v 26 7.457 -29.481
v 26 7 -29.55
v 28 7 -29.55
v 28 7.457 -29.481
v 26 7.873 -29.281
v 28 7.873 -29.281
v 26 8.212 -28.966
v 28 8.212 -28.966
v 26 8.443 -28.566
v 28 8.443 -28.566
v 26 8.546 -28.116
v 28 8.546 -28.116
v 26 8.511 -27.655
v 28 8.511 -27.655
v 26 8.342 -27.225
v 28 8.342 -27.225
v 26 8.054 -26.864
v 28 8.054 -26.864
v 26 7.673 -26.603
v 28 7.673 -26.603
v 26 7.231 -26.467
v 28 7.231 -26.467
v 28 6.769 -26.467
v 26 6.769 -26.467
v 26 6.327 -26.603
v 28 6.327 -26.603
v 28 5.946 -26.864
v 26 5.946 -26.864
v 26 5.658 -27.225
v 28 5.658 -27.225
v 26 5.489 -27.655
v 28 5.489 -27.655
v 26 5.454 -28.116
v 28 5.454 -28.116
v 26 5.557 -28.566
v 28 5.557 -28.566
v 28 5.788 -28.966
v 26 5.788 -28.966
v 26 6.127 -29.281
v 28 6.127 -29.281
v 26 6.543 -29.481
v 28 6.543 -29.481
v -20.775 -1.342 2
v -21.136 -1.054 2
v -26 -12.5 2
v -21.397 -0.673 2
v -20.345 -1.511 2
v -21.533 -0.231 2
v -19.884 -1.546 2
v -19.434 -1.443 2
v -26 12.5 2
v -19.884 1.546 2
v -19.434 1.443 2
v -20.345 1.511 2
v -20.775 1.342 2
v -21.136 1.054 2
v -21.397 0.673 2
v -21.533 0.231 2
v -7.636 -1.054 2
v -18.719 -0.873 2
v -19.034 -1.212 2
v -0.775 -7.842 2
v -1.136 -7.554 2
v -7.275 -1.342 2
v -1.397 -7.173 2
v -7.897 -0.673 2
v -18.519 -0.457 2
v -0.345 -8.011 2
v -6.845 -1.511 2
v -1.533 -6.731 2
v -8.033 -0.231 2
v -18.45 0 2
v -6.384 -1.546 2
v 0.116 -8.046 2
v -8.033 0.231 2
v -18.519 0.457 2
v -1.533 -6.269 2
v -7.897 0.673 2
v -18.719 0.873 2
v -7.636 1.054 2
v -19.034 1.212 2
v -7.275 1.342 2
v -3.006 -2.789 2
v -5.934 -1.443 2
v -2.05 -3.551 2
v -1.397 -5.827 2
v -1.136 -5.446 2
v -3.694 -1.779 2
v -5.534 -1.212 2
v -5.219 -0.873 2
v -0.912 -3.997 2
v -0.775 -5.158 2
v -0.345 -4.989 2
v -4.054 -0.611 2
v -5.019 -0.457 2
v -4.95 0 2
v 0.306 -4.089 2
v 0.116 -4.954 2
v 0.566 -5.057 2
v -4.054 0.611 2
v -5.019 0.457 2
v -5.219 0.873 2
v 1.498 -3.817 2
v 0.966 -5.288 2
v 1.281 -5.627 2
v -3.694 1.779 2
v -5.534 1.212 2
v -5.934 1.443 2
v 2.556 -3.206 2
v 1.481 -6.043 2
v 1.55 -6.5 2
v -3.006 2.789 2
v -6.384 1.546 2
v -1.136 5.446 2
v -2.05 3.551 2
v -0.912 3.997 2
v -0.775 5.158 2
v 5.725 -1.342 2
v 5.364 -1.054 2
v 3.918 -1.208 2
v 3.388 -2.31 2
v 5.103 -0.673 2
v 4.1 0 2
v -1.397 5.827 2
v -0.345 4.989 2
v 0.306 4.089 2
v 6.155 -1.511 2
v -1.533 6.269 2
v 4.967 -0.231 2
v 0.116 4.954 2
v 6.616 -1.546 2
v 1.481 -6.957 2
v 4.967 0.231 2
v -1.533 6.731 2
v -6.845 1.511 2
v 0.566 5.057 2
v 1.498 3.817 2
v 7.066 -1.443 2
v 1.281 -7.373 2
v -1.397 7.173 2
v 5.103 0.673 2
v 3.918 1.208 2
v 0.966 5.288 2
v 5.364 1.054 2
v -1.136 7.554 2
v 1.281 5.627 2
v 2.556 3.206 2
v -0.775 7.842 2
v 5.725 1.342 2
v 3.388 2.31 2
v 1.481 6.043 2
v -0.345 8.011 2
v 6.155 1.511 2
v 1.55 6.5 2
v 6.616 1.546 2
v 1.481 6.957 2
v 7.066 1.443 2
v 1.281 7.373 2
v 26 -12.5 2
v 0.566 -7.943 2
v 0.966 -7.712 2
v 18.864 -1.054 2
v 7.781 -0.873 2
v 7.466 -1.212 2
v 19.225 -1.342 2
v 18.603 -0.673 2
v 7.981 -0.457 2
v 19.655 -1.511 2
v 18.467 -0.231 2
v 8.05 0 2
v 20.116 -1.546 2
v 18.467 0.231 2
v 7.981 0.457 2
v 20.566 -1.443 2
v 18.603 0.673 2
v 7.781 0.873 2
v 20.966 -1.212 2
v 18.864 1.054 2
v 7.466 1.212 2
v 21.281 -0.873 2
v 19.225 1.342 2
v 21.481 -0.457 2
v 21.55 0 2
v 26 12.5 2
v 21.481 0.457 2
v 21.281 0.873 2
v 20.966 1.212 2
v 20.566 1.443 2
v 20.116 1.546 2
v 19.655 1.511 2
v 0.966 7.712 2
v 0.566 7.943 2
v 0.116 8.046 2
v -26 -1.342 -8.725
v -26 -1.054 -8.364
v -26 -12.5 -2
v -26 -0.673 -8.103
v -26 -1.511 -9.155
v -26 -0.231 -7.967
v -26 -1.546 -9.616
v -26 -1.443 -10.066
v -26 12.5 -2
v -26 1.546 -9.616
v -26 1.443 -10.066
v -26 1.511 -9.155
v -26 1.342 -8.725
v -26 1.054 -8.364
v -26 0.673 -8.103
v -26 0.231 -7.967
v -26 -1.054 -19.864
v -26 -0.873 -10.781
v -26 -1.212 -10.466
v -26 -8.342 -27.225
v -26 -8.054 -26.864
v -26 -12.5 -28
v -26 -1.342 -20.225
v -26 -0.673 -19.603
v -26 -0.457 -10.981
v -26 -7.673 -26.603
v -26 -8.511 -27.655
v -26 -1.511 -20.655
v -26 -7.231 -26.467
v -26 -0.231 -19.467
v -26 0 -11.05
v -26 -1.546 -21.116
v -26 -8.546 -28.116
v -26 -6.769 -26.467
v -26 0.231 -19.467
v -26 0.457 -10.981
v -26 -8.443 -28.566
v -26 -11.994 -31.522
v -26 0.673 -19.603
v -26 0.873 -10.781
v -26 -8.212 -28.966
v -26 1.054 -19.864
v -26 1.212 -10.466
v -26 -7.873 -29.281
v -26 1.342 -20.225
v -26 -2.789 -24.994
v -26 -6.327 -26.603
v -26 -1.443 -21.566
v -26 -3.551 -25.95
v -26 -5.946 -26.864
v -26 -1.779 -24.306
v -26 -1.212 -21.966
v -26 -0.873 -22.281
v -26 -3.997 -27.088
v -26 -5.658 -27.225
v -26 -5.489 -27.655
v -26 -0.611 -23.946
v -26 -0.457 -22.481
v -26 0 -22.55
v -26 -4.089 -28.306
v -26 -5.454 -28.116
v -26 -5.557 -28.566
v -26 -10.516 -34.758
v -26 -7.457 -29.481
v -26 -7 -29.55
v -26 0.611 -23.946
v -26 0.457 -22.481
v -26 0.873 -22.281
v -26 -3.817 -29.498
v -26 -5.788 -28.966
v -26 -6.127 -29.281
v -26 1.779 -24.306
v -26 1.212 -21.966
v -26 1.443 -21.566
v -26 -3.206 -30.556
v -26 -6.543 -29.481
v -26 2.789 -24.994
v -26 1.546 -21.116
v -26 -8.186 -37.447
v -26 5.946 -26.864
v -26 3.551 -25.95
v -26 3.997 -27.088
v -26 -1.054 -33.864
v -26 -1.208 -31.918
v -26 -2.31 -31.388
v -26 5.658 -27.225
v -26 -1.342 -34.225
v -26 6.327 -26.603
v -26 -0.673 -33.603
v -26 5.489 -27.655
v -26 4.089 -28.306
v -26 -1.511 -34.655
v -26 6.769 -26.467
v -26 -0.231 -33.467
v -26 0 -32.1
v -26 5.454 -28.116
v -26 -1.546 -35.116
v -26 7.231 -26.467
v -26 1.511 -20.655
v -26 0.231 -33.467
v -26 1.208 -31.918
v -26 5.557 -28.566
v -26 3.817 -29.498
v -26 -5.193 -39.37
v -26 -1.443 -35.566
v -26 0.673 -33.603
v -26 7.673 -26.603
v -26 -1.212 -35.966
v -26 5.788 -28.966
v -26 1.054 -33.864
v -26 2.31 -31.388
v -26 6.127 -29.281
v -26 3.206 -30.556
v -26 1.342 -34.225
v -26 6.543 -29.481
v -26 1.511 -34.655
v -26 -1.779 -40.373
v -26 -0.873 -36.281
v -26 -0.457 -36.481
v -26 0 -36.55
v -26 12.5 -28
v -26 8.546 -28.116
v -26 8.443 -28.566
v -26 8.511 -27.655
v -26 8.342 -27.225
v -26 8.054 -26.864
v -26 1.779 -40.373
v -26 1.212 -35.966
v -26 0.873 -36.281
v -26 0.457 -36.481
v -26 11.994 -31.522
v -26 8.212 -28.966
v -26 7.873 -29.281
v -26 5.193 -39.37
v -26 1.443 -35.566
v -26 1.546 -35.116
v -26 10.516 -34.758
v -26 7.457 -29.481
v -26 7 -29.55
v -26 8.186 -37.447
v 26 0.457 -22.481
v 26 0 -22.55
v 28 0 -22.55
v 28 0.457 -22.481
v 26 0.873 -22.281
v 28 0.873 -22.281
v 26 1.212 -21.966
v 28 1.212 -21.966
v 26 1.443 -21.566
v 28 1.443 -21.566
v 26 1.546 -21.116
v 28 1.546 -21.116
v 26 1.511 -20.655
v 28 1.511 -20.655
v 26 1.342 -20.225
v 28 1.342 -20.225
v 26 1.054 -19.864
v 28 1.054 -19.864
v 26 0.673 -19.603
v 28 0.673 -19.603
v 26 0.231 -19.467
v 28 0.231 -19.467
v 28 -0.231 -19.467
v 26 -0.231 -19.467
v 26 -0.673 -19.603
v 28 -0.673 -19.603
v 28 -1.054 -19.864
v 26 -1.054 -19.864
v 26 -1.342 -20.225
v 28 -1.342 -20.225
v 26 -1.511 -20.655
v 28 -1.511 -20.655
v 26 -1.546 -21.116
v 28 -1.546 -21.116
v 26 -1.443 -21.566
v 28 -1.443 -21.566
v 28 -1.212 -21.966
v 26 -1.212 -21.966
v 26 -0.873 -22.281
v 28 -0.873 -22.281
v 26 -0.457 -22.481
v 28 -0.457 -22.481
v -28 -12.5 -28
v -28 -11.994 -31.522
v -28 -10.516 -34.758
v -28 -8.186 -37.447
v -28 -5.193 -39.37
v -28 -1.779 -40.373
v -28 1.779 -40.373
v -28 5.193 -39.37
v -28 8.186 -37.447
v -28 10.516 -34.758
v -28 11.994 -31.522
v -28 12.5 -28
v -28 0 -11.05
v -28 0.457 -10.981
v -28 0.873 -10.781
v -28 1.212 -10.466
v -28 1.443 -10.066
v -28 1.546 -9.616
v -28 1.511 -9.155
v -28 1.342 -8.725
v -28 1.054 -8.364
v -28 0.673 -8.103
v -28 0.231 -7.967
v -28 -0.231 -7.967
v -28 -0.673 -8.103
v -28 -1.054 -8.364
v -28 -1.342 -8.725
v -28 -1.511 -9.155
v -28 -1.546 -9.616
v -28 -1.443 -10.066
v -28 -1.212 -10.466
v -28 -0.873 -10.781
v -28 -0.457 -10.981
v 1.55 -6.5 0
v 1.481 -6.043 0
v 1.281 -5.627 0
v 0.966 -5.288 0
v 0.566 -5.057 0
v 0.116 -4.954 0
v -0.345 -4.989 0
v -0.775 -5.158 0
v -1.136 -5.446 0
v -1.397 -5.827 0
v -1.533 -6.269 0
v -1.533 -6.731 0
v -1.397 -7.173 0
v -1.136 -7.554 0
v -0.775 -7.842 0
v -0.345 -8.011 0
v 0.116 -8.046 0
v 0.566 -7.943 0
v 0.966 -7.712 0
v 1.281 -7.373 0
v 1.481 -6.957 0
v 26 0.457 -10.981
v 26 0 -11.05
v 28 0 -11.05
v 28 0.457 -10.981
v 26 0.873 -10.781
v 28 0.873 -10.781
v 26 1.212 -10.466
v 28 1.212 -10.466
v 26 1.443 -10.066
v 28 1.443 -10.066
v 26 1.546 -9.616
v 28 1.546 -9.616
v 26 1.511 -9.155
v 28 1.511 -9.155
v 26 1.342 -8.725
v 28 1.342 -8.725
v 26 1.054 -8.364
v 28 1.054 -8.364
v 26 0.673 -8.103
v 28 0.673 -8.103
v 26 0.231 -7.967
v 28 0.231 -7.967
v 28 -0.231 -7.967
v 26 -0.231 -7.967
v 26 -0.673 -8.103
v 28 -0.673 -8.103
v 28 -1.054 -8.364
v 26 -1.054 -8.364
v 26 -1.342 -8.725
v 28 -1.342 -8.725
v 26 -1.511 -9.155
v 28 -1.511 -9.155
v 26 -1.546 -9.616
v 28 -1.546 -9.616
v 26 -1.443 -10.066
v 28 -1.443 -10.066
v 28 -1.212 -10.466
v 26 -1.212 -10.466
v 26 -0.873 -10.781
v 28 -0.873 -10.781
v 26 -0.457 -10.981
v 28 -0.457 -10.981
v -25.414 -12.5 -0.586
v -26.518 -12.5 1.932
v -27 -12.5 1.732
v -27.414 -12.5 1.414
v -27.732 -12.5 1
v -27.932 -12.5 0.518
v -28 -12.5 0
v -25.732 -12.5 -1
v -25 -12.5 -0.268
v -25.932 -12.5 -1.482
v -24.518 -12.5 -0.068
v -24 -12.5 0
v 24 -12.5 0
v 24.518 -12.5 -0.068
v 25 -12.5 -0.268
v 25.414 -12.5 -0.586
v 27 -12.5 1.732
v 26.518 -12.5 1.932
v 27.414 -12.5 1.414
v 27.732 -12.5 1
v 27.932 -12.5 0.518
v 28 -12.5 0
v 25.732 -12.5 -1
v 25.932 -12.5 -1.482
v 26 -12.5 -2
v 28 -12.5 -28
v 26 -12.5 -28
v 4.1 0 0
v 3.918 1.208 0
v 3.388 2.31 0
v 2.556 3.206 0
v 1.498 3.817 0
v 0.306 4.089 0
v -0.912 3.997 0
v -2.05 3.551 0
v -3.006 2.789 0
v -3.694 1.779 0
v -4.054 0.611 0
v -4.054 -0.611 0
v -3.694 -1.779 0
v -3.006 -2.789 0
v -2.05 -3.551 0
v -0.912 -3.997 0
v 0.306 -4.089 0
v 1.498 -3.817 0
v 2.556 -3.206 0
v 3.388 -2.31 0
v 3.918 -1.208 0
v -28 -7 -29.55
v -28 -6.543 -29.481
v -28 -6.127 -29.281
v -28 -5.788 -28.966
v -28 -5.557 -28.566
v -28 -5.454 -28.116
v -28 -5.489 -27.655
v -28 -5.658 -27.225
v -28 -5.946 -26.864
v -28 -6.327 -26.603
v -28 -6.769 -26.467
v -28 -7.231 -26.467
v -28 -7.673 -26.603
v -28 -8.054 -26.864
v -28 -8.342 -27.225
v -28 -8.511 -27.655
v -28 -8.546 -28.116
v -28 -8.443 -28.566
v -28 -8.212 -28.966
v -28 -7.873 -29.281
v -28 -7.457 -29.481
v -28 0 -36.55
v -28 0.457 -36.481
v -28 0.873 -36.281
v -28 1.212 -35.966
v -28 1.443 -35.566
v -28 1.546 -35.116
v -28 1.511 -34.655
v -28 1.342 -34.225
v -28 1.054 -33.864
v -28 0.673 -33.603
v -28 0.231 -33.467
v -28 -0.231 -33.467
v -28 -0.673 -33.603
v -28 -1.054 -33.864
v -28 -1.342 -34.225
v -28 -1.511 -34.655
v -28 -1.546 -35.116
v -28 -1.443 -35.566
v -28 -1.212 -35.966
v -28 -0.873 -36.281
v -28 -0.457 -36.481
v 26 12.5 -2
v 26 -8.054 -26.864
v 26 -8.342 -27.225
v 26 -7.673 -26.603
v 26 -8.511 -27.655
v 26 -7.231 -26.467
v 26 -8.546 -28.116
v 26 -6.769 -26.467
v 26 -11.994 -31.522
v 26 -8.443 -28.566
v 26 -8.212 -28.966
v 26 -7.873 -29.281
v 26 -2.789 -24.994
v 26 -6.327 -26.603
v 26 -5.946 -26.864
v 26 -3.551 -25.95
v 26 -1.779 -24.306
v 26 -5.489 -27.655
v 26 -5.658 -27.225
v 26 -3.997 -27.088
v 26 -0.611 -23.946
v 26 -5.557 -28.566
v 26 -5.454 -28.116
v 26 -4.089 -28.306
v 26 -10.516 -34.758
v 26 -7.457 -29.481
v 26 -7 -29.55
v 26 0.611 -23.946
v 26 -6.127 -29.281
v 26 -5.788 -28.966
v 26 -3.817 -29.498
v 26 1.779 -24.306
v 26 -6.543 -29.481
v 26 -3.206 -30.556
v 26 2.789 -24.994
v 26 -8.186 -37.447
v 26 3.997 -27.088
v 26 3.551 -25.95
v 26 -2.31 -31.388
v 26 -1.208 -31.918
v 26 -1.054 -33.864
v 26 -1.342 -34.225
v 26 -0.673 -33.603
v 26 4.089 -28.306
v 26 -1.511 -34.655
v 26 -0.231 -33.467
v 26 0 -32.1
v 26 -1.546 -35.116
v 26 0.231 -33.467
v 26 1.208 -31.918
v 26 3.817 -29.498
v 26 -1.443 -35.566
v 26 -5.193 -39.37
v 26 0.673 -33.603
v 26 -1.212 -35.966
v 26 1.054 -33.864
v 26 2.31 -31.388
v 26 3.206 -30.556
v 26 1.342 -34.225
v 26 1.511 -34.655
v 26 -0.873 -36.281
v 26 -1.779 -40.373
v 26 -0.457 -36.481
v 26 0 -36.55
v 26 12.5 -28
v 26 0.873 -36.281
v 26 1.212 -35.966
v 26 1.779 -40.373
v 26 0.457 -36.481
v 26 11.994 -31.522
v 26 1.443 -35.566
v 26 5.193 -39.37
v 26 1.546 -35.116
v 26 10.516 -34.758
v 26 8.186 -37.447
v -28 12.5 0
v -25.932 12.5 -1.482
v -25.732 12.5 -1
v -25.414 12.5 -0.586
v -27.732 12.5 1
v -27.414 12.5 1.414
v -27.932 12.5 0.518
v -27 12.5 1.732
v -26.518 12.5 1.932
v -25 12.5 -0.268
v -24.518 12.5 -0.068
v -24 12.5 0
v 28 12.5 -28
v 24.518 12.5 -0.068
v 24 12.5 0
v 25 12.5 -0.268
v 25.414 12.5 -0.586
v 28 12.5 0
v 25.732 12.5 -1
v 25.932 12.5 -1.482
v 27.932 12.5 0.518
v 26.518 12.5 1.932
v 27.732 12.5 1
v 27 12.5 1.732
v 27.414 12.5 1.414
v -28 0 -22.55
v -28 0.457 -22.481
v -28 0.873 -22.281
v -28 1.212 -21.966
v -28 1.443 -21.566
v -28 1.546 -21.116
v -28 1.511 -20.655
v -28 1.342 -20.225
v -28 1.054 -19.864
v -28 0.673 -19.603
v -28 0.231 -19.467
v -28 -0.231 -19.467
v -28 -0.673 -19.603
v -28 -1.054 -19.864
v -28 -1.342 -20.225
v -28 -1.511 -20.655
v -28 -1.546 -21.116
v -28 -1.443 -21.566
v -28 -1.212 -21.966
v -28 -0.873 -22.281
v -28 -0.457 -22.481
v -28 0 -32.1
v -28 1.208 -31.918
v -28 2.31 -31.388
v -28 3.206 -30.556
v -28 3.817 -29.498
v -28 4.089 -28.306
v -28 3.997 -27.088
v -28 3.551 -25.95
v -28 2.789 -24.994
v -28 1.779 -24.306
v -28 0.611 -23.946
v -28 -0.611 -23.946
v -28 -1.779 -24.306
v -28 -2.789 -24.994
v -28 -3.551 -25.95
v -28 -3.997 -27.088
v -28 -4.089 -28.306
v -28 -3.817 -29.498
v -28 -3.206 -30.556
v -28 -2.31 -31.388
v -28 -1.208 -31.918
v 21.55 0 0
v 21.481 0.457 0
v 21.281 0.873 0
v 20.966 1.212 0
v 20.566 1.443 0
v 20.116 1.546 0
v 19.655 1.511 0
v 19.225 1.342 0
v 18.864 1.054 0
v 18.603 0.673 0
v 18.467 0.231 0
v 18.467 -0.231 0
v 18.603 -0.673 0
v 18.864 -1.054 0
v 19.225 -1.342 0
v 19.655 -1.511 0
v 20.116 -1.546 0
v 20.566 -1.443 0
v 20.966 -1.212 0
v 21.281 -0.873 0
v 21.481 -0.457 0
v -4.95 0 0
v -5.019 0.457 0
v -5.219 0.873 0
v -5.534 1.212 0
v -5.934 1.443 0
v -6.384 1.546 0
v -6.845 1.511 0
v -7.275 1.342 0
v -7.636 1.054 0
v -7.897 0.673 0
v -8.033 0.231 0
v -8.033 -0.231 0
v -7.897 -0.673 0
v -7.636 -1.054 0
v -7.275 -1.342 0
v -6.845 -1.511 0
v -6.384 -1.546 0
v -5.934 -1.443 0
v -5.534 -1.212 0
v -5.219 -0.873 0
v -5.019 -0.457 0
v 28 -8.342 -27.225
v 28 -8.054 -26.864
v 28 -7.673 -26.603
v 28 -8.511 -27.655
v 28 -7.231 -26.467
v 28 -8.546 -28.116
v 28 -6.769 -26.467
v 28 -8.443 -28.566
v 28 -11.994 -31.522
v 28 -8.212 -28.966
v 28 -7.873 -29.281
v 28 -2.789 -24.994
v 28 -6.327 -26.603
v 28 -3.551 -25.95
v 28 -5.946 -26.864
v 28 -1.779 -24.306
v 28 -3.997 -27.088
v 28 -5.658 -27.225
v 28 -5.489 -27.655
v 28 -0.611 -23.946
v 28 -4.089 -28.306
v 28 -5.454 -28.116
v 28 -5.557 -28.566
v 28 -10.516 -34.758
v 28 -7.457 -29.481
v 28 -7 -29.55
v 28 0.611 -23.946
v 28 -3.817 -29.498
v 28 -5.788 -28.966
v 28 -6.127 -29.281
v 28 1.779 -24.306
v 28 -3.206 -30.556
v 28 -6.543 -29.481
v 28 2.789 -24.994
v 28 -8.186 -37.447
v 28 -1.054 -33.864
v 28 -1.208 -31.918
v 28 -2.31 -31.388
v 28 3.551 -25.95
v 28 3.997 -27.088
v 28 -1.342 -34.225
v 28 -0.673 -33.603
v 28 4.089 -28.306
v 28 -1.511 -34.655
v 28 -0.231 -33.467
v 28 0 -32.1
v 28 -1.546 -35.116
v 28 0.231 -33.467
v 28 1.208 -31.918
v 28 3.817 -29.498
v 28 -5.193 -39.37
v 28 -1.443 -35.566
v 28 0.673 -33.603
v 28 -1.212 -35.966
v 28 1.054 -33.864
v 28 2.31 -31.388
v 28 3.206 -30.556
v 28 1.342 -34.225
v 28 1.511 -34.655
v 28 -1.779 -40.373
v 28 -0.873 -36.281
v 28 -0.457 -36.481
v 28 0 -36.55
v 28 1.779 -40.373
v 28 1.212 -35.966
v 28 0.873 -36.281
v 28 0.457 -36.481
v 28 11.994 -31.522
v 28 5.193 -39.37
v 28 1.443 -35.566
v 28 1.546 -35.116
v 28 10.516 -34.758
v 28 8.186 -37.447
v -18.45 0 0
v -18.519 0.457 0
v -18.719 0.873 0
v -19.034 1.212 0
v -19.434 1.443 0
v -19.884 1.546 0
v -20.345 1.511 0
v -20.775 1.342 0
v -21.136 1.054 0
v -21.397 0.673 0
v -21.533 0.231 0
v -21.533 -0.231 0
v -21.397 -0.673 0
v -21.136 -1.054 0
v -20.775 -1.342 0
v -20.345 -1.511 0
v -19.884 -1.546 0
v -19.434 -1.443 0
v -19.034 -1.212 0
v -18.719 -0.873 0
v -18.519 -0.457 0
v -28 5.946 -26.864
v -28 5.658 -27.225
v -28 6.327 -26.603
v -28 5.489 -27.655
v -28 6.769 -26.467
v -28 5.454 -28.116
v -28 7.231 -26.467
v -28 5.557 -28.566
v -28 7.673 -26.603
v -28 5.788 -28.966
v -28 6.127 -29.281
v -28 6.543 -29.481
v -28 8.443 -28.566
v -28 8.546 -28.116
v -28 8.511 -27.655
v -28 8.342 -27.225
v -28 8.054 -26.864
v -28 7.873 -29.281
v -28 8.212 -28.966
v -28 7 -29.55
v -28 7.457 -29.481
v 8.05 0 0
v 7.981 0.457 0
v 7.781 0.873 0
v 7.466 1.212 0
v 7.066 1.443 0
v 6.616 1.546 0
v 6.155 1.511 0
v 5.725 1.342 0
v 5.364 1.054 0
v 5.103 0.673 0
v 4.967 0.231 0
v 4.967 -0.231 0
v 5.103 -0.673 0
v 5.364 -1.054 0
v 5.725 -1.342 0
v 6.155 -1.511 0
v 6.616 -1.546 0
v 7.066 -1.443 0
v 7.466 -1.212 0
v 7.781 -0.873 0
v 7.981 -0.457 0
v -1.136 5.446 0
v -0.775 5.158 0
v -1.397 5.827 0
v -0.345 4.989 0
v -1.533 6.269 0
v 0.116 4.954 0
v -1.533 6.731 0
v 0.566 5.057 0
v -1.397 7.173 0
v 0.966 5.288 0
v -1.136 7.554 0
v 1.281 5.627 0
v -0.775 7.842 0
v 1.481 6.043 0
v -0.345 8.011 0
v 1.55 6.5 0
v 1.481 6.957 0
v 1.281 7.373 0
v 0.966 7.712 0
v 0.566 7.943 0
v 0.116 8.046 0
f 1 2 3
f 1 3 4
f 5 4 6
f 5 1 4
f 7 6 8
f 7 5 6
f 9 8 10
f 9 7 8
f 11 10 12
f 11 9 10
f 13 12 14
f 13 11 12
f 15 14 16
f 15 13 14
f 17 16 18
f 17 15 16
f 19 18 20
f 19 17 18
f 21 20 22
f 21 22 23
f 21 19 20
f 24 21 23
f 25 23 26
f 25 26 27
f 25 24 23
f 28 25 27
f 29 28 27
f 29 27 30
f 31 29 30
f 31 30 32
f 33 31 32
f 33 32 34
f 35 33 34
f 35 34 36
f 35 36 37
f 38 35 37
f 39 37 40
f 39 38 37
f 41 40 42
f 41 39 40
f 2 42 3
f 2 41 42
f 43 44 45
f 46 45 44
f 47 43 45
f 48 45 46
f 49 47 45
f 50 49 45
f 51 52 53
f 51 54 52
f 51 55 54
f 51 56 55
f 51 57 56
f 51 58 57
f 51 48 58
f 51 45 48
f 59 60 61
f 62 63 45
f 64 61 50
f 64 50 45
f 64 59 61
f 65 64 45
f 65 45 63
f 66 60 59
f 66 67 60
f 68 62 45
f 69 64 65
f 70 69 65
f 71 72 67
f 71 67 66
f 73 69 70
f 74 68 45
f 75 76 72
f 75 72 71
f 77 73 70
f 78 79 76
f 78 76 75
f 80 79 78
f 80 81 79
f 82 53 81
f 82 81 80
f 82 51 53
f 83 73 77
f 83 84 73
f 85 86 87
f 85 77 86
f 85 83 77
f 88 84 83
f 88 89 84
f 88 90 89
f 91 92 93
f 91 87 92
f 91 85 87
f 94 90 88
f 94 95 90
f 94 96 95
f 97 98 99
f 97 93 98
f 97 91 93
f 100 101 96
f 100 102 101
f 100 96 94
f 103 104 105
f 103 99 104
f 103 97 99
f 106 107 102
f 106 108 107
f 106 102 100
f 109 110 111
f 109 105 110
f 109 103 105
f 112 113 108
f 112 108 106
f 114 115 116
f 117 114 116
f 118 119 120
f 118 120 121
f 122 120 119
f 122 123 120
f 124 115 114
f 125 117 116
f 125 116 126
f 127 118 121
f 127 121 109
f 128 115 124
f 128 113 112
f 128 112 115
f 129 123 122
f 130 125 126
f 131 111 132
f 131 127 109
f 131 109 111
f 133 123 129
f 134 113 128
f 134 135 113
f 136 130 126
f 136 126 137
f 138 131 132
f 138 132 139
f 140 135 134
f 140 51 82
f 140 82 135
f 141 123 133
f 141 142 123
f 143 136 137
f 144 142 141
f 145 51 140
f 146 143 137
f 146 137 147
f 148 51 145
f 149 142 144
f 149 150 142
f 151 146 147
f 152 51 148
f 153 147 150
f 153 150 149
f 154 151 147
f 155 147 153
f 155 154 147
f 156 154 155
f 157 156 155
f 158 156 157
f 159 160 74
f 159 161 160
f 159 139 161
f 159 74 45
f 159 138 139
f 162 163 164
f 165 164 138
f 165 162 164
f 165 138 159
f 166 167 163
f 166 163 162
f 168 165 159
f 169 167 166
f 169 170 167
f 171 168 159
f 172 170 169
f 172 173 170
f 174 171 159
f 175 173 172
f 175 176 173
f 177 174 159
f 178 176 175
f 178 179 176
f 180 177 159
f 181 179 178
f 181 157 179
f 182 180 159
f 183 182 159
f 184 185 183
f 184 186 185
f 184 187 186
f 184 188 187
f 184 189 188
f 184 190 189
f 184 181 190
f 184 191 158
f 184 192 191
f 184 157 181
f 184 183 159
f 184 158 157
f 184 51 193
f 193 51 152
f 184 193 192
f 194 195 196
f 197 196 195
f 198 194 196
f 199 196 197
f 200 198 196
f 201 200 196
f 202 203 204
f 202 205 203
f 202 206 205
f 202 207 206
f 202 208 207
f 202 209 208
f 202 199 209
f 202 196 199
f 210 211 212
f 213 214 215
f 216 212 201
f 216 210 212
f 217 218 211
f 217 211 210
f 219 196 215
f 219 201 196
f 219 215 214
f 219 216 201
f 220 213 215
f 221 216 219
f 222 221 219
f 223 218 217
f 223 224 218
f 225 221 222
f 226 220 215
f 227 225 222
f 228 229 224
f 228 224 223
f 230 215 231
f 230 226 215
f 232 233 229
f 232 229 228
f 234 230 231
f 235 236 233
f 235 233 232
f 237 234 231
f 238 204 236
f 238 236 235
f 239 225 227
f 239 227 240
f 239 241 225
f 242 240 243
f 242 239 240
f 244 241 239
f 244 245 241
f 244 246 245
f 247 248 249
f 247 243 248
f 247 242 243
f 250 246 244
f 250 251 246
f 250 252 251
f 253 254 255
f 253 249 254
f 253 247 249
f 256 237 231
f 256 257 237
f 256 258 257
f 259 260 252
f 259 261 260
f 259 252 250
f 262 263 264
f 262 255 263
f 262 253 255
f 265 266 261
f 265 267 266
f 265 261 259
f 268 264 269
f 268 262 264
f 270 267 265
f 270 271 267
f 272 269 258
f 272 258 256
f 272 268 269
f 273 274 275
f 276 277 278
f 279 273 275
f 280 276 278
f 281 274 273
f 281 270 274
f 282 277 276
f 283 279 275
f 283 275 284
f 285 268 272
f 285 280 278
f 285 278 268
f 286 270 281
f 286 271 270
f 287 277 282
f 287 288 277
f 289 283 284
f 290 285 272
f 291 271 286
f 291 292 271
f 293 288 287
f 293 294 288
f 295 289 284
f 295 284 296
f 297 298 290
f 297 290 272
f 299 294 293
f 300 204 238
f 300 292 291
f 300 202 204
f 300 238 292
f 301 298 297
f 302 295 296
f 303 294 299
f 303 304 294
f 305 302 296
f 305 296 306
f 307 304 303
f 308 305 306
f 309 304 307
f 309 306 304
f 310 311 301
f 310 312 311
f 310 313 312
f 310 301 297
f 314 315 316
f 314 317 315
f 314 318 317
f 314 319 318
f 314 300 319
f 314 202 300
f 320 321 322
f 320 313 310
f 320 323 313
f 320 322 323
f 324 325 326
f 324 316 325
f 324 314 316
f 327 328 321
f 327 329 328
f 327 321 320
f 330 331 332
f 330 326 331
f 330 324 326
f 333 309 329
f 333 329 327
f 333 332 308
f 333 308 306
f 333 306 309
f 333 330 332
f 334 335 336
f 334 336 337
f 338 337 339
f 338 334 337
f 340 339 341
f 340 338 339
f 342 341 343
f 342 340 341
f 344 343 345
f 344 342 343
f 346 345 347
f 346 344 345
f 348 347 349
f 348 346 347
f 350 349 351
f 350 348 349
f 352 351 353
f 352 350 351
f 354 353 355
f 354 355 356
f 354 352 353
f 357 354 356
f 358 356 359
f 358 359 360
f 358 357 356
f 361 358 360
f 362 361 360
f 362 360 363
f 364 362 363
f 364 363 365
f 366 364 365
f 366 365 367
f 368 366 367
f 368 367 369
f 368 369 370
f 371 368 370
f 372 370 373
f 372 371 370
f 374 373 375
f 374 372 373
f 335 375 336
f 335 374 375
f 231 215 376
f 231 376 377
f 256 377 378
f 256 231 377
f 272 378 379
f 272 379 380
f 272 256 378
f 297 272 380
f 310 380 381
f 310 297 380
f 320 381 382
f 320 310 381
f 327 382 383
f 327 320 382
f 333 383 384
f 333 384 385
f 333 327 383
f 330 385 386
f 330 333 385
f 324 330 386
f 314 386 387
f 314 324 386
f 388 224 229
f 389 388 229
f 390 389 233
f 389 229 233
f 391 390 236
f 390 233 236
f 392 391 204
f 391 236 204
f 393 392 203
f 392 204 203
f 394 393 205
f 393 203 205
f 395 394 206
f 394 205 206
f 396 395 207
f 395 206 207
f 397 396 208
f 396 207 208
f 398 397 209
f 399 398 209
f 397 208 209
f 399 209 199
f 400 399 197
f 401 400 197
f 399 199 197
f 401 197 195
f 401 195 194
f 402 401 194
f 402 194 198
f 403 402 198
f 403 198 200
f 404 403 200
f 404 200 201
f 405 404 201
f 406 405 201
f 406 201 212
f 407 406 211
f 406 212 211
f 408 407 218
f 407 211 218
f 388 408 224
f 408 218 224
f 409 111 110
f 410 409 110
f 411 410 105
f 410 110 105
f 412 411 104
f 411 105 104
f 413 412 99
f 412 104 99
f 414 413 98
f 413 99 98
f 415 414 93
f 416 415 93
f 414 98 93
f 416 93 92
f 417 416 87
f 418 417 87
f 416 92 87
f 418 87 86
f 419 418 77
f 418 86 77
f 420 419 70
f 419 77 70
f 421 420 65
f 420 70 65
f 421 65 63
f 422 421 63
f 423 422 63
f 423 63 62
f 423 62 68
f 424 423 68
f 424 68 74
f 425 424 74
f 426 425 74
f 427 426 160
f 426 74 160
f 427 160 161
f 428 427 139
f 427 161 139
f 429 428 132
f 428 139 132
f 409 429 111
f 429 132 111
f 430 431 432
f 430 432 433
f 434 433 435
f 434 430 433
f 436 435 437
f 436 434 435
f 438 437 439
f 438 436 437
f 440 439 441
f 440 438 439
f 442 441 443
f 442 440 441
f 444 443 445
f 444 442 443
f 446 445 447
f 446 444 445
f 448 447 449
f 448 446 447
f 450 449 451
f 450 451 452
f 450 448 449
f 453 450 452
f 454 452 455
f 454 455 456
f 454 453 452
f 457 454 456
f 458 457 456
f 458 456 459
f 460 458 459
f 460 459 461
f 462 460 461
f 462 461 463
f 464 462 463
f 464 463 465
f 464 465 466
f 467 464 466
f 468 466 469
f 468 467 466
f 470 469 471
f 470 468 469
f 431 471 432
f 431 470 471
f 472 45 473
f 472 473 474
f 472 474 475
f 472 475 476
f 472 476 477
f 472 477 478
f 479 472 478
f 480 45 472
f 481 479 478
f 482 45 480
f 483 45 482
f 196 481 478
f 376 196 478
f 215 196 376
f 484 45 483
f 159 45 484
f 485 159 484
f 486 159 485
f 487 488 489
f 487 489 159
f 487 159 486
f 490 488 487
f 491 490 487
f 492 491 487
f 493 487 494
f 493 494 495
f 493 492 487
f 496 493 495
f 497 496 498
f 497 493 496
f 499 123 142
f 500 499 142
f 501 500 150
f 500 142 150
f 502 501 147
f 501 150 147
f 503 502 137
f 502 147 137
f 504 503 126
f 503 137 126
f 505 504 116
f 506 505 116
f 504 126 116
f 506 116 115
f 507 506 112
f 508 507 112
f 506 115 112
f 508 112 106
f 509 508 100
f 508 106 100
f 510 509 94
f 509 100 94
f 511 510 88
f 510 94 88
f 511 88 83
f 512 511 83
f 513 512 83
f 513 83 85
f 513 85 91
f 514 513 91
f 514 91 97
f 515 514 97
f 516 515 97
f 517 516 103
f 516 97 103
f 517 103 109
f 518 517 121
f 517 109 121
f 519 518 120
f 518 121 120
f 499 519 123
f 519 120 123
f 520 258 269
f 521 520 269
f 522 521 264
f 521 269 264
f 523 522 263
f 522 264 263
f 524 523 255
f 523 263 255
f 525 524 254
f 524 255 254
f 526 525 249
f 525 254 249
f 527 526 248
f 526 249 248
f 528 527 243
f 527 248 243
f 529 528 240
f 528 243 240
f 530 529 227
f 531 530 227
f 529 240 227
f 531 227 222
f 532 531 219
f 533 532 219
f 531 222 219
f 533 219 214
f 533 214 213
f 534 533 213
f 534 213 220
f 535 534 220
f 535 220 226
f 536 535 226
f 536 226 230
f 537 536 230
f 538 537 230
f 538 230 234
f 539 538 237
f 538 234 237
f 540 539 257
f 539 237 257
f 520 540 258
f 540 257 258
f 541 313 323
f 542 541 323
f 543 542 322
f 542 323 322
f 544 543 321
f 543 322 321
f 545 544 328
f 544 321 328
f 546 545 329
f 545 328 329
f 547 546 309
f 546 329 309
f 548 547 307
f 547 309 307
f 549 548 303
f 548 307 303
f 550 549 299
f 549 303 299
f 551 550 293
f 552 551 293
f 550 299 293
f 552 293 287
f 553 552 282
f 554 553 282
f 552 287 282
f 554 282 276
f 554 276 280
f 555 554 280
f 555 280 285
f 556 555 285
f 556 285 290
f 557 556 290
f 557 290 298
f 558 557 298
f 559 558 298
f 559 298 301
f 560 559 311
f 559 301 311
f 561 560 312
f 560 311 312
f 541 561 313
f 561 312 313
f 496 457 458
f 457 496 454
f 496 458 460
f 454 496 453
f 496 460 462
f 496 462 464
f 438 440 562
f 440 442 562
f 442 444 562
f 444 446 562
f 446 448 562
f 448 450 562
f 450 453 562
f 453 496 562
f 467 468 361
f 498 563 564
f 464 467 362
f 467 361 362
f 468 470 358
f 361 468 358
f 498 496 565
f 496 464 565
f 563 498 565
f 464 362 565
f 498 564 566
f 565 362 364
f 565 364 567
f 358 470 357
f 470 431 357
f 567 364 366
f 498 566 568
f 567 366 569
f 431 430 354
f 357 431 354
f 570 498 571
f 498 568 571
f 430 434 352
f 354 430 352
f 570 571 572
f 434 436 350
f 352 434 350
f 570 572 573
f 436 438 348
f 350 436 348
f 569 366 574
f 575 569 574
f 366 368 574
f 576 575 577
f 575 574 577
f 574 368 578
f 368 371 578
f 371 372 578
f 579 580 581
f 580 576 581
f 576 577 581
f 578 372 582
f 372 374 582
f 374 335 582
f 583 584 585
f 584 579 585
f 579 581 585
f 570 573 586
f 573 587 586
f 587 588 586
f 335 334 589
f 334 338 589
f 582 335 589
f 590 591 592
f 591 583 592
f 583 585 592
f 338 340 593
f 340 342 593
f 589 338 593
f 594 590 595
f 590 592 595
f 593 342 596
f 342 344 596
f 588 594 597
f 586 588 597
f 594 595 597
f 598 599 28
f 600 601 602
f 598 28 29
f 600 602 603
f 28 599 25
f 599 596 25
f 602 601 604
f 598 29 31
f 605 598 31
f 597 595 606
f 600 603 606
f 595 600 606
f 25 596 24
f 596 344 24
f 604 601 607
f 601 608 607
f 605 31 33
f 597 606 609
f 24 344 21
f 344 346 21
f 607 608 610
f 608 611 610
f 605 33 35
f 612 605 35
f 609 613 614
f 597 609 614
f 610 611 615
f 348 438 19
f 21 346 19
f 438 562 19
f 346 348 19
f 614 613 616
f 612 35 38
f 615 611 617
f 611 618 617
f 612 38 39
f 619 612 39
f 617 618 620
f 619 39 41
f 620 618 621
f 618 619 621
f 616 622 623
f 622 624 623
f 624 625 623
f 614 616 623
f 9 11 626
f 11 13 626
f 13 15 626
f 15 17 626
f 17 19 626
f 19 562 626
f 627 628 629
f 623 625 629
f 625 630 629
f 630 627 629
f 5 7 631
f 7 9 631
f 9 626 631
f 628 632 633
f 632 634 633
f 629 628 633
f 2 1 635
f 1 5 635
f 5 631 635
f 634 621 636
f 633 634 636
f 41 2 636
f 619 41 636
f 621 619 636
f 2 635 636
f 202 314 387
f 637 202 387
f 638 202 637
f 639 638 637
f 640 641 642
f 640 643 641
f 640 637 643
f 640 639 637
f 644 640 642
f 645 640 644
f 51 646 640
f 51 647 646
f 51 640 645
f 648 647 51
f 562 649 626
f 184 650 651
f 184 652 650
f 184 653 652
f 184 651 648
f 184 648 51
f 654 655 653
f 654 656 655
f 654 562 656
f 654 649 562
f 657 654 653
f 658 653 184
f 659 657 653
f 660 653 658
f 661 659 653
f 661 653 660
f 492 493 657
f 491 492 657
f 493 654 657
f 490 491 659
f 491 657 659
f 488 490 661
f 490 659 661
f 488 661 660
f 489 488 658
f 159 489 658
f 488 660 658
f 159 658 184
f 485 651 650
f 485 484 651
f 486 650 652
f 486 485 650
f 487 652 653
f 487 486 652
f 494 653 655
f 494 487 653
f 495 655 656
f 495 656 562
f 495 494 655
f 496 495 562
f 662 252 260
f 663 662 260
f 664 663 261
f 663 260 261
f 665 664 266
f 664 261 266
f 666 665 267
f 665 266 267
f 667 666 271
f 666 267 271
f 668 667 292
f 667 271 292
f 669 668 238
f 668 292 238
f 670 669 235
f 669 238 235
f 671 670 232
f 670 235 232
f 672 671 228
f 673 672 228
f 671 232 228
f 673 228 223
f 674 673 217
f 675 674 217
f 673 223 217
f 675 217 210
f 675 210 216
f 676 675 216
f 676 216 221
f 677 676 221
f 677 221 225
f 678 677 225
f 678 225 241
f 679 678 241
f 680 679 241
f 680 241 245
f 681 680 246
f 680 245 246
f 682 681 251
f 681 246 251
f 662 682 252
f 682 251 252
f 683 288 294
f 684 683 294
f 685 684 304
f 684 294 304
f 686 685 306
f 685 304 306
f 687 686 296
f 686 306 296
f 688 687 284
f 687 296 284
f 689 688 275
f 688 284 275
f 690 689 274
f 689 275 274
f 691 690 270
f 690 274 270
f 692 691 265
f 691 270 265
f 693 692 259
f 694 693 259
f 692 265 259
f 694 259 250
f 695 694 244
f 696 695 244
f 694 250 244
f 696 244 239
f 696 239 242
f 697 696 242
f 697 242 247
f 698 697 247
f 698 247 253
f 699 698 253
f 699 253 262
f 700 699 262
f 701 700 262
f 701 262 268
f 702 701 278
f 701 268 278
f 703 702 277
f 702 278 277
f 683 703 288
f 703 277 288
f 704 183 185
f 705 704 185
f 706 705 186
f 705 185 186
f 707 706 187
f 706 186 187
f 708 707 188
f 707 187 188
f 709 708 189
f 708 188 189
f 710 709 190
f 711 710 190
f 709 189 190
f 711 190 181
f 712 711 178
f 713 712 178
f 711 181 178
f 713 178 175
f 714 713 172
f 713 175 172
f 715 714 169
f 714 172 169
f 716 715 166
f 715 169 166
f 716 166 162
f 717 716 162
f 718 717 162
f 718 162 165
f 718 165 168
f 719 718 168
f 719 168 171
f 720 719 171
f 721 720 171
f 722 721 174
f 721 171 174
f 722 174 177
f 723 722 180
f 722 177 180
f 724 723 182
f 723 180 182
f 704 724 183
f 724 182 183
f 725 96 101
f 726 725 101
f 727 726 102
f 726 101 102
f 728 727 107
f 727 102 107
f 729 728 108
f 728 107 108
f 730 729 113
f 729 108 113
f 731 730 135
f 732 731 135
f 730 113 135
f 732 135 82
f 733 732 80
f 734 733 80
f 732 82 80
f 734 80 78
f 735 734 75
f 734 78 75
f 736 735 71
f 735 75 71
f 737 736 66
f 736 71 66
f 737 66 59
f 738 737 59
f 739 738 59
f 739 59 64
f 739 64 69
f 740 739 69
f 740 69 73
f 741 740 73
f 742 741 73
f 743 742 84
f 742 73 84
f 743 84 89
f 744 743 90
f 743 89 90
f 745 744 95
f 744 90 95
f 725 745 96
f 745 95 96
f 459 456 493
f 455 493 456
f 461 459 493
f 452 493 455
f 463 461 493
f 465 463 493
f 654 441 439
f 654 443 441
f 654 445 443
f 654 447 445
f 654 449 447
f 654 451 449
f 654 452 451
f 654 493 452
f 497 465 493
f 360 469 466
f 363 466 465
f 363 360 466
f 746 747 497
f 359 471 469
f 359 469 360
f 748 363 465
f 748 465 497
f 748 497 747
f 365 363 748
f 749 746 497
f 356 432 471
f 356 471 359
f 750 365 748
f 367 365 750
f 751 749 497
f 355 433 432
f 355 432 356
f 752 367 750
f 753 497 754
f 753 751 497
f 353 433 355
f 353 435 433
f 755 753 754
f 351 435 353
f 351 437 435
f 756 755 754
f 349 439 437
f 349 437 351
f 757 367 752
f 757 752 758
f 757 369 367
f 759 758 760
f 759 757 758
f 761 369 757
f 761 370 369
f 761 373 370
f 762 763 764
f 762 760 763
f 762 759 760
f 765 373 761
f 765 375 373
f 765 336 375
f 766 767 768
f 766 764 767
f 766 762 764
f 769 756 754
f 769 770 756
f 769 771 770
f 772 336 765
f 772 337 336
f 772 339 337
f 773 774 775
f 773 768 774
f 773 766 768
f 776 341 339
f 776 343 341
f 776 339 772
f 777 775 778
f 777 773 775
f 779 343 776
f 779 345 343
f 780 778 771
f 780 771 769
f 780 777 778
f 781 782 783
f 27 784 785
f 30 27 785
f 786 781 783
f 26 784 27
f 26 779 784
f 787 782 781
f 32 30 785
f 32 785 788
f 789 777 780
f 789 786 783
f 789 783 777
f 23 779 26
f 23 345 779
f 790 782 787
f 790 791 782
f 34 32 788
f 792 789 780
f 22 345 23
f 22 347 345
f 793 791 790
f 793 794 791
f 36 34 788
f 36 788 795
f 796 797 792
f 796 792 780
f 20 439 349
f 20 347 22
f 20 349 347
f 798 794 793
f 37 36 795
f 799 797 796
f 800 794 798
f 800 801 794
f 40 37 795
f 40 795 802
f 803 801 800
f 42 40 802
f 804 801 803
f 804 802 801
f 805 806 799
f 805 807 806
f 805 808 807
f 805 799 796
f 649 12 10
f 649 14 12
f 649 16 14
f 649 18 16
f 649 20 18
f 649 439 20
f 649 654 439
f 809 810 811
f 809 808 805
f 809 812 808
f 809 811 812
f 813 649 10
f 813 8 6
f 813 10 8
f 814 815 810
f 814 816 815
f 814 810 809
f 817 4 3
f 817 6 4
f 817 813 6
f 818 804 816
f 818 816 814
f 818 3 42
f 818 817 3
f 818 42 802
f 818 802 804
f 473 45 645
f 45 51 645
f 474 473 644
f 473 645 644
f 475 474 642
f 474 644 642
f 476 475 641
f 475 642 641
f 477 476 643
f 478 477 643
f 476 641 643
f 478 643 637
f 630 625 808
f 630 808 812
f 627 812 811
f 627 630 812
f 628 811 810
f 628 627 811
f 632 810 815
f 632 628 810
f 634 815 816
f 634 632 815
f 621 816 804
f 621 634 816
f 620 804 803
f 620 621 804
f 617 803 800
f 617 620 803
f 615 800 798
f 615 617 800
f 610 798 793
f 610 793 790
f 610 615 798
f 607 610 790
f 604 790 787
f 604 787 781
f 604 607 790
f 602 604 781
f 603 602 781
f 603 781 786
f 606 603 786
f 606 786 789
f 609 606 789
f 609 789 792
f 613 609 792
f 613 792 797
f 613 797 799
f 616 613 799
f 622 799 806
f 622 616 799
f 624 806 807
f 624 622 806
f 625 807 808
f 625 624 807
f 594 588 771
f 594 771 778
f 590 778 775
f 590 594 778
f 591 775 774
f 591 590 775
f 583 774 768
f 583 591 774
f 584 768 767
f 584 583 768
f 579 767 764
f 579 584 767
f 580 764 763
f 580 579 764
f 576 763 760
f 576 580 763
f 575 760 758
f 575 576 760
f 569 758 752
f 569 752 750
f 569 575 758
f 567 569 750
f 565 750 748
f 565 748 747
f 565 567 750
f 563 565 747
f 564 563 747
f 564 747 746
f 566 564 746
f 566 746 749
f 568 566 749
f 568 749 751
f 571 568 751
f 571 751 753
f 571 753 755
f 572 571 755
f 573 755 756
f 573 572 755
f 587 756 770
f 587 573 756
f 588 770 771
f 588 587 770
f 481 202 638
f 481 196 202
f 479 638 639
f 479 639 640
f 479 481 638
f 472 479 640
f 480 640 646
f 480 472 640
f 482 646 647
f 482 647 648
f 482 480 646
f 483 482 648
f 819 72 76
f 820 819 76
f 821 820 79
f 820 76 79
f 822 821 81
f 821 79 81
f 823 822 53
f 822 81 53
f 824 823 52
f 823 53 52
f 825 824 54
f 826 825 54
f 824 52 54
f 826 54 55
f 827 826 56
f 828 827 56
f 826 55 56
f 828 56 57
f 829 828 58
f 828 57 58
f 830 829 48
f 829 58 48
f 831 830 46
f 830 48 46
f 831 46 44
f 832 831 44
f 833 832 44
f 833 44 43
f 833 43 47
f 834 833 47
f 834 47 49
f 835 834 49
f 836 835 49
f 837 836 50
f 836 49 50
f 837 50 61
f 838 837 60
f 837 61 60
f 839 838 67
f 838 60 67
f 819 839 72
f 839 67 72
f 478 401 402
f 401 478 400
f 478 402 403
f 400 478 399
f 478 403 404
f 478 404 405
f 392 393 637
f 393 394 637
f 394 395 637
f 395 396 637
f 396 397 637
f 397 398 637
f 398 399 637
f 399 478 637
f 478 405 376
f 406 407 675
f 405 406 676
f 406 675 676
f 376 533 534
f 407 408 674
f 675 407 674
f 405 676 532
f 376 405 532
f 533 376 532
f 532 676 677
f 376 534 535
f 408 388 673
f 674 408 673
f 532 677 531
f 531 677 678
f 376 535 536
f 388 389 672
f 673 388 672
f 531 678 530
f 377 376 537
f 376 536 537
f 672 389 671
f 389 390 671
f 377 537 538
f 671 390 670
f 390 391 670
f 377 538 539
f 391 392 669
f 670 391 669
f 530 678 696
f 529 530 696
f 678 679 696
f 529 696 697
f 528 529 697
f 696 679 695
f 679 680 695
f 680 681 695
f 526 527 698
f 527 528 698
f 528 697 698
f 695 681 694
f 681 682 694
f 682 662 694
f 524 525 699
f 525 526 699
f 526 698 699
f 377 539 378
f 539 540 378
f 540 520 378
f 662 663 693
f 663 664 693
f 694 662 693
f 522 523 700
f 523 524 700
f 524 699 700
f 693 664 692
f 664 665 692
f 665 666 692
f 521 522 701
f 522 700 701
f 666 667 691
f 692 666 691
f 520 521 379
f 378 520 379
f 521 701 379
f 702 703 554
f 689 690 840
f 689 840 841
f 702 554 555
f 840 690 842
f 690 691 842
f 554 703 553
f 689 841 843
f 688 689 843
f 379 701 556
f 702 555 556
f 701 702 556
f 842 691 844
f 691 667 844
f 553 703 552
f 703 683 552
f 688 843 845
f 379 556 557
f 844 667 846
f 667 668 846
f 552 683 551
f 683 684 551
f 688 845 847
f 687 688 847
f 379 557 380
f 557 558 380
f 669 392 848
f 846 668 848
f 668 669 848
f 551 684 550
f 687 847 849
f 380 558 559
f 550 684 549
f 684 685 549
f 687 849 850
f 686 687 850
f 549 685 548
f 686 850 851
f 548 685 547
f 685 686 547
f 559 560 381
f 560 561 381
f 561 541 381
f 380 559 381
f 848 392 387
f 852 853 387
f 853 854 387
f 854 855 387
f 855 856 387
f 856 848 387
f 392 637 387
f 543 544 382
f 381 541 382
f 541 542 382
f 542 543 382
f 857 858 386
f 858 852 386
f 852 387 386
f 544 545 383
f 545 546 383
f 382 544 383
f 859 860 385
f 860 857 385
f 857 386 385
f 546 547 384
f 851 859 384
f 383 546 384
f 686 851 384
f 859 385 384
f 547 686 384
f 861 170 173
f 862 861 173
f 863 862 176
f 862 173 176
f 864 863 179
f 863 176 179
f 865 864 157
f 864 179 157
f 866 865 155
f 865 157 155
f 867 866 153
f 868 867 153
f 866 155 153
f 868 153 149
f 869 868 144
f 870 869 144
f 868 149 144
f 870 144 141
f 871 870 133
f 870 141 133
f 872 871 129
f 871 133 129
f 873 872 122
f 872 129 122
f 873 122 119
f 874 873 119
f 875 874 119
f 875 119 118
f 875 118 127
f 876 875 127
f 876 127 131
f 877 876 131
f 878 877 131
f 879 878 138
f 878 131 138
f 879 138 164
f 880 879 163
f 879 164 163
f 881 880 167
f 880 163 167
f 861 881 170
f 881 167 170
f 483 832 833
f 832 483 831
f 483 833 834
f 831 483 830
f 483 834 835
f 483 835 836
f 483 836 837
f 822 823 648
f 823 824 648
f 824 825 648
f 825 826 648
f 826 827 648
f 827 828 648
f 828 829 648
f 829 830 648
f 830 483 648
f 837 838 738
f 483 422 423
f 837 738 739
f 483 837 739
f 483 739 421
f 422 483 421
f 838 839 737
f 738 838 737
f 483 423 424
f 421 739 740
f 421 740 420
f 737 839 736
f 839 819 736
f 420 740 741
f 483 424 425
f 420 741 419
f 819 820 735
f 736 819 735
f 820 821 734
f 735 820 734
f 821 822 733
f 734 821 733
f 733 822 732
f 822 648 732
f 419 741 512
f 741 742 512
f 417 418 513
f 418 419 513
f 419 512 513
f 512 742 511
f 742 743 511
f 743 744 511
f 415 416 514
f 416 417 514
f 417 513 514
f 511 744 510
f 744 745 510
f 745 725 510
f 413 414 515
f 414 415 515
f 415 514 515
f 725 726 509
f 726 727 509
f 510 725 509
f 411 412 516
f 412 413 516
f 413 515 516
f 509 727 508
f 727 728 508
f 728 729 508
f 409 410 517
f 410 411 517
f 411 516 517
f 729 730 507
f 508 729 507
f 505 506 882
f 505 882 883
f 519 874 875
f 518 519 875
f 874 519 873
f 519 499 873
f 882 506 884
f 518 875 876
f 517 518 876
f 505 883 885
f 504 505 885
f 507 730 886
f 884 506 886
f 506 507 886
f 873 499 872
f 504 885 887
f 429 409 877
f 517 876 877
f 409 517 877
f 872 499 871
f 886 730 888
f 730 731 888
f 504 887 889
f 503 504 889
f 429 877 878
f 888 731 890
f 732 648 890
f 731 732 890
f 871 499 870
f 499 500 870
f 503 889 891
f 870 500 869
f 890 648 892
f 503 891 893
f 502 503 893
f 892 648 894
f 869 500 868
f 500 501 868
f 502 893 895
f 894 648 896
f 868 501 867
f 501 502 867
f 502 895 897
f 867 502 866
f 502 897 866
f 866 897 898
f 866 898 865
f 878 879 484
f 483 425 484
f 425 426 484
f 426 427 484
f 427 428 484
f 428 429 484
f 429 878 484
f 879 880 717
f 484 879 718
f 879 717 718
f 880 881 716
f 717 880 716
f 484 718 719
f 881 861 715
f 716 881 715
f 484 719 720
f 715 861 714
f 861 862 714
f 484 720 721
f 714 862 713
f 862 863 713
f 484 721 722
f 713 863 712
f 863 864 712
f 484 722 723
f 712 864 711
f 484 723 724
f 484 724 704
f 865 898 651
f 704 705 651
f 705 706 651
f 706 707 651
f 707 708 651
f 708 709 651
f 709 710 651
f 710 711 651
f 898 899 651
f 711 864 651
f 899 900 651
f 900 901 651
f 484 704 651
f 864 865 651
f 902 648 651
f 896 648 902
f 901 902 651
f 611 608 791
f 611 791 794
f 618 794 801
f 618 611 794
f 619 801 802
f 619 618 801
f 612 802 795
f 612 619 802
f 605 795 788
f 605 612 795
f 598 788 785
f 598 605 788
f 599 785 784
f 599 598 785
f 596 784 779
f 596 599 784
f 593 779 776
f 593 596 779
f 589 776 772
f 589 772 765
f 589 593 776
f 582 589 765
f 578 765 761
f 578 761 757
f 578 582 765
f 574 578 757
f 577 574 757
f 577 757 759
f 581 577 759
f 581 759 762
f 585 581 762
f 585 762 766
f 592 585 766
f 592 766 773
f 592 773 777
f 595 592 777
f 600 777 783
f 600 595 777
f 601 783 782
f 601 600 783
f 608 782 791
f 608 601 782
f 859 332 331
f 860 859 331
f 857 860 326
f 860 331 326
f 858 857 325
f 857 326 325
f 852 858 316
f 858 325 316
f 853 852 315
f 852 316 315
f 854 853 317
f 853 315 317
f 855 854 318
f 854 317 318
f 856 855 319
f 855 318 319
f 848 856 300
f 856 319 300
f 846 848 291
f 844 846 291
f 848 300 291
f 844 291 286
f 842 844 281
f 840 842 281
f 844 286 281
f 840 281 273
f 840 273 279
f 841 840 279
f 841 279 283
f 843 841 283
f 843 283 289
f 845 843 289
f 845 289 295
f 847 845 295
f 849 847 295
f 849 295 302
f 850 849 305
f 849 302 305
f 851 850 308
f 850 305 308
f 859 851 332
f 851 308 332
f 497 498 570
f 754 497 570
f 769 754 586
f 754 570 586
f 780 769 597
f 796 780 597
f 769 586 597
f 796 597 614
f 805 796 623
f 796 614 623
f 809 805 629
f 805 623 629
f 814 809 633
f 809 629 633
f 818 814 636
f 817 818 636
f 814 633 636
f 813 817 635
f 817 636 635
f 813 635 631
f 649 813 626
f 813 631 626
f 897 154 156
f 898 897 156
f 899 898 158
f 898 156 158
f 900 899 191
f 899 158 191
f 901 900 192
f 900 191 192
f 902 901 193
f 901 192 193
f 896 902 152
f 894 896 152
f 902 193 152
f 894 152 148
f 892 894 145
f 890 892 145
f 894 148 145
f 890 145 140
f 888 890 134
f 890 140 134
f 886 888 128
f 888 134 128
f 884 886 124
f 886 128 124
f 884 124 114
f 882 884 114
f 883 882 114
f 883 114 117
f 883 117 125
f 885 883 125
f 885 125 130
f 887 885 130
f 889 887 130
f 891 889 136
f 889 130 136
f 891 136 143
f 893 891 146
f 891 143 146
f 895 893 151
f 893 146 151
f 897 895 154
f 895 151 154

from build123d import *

# Parameters (mm, degrees)
SKETCH_1_W            = 56
SKETCH_1_H            = 25
EXTRUDE_1_DEPTH       = 2
EXTRUDE_START         = -2
EXTRUDE_2_OUTLINE_R   = 1.55
EXTRUDE_2_OUTLINE_R_2 = 4.1
EXTRUDE_2_DEPTH       = 2
SKETCH_3_R            = 1.55
SKETCH_3_R_2          = 4.1
CUT_EXTRUDE_1_DEPTH   = 2
FILLET_1_R            = 2


# Read off the part's stored shape, not the designer's step: 凸台-拉伸2
with BuildPart() as part:
    # 草图1 → 凸台-拉伸1 (new body)
    with BuildSketch(Plane.XY):
        Rectangle(SKETCH_1_W, SKETCH_1_H)
    extrude(amount=EXTRUDE_1_DEPTH)

    # 凸台-拉伸2 outline → 凸台-拉伸2 (add)
    with BuildSketch(Plane(origin=(28, 0, 0), x_dir=(0, 0, -1), z_dir=(1, 0, 0)).offset(EXTRUDE_START)):
        with BuildLine():
            Line((0, -12.5), (28, -12.5))
            ThreePointArc((28, -12.5), (40.5, 0), (28, 12.5))
            Line((28, 12.5), (0, 12.5))
            Line((0, 12.5), (0, -12.5))
        make_face()
        with Locations((28, -7)):
            Circle(EXTRUDE_2_OUTLINE_R, mode=Mode.SUBTRACT)
        with Locations((9.5, 0)):
            Circle(EXTRUDE_2_OUTLINE_R, mode=Mode.SUBTRACT)
        with Locations((21, 0)):
            Circle(EXTRUDE_2_OUTLINE_R, mode=Mode.SUBTRACT)
        with Locations((28, 0)):
            Circle(EXTRUDE_2_OUTLINE_R_2, mode=Mode.SUBTRACT)
        with Locations((35, 0)):
            Circle(EXTRUDE_2_OUTLINE_R, mode=Mode.SUBTRACT)
        with Locations((28, 7)):
            Circle(EXTRUDE_2_OUTLINE_R, mode=Mode.SUBTRACT)
    extrude_2 = extrude(amount=EXTRUDE_2_DEPTH)

    # 镜向2: 凸台-拉伸2 across plane
    add(extrude_2.mirror(Plane.ZY))

    # 草图3 → 切除-拉伸1 (cut)
    with BuildSketch(Plane.XY.offset(2)):
        with Locations((-20, 0)):
            Circle(SKETCH_3_R)
        with Locations((-6.5, 0)):
            Circle(SKETCH_3_R)
        with Locations((6.5, 0)):
            Circle(SKETCH_3_R)
        with Locations((0, -6.5)):
            Circle(SKETCH_3_R)
        Circle(SKETCH_3_R_2)
        with Locations((0, 6.5)):
            Circle(SKETCH_3_R)
        with Locations((20, 0)):
            Circle(SKETCH_3_R)
    extrude(amount=-CUT_EXTRUDE_1_DEPTH, mode=Mode.SUBTRACT)

    # 圆角1
    fillet_1_edges = [part.edges().sort_by_distance(p)[0] for p in [
        (-28, 0, 2),
        (26, 0, 0),
        (-26, 0, 0),
        (28, 0, 2),
    ]]
    fillet(fillet_1_edges, radius=FILLET_1_R)


solid = part.part
